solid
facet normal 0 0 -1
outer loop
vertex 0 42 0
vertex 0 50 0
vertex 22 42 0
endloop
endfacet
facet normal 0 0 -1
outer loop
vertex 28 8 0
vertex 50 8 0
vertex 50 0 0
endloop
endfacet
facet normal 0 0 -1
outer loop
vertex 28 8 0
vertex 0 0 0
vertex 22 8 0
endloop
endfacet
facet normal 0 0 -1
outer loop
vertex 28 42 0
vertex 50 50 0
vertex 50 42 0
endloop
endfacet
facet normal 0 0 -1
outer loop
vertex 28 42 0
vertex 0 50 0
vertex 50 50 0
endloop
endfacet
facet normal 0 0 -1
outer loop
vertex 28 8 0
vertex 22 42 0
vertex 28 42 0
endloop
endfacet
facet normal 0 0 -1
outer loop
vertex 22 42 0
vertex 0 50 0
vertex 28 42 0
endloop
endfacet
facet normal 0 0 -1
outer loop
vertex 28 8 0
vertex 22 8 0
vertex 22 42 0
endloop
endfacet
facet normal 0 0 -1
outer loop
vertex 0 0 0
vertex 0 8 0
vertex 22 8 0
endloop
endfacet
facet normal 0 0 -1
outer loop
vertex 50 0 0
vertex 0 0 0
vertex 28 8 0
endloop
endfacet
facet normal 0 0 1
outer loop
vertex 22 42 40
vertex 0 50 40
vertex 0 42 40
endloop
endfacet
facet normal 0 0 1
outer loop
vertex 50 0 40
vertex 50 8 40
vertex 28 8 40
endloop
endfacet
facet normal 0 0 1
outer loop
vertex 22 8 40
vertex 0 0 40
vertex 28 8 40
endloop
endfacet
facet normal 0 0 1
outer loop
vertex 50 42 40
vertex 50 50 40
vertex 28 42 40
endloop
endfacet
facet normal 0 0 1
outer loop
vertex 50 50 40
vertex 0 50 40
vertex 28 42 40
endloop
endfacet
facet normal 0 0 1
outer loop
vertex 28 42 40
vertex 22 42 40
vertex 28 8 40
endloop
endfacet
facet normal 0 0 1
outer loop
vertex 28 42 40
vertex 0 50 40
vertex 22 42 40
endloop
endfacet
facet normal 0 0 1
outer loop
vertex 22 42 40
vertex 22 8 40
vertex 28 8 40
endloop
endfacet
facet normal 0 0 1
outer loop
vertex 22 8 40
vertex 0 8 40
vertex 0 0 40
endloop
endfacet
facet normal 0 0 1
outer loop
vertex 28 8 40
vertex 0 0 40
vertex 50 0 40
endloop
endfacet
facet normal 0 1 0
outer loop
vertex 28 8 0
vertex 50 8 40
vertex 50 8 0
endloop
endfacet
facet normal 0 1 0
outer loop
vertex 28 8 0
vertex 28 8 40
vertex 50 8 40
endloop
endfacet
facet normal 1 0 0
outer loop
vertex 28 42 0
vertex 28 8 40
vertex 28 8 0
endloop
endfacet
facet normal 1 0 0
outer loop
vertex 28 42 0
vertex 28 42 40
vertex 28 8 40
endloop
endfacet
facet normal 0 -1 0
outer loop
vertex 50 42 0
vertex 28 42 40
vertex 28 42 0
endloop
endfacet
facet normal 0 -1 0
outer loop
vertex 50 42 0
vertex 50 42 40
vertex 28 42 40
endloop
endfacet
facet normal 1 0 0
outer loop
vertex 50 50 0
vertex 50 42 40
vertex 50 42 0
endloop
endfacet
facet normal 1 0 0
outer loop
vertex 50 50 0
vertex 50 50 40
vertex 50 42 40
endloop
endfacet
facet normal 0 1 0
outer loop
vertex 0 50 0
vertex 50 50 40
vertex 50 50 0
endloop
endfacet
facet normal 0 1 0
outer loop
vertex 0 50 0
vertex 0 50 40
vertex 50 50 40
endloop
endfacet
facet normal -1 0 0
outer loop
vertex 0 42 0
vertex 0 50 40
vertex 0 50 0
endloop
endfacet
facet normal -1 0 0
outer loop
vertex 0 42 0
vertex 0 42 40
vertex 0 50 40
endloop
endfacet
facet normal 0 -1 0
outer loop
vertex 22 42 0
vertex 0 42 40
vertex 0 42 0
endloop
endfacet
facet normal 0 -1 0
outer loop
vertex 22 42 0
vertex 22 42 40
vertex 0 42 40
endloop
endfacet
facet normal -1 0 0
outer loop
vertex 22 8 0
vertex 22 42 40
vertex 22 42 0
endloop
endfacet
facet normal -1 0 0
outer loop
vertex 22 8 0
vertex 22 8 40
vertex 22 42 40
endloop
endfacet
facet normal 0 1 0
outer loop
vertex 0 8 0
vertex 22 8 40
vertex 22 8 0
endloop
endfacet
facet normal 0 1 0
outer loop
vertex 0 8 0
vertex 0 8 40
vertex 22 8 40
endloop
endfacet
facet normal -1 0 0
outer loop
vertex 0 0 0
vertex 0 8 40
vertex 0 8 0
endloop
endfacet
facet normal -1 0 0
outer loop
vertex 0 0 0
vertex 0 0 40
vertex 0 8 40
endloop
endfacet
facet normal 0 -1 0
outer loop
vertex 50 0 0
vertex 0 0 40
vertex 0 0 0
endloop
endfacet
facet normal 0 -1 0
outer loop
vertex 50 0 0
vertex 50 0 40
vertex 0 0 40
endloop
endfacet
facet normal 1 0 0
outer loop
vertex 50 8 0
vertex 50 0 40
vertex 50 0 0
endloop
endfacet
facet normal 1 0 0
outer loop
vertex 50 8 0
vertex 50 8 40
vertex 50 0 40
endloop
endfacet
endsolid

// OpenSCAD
$fn = 32;

// ----------------------------------------------------------------------
// Structural section: ibeam 50 x 50 mm
// ----------------------------------------------------------------------

// --- parameters (mm) ---
sec_w = 50;               // section width, X
sec_h = 50;               // section height, Y
flange_t = 8;             // flange thickness
web_t = 6;                // web thickness
plate_t = 40;             // cut length, Z (extrusion height)

profile = [[0, 0], [50, 0], [50, 8], [28, 8], [28, 42], [50, 42], [50, 50], [0, 50], [0, 42], [22, 42], [22, 8], [0, 8]];  // primary outline, 12 points, counter clockwise

// --- the one profile operation ---
linear_extrude(height = plate_t) polygon(points = profile);
